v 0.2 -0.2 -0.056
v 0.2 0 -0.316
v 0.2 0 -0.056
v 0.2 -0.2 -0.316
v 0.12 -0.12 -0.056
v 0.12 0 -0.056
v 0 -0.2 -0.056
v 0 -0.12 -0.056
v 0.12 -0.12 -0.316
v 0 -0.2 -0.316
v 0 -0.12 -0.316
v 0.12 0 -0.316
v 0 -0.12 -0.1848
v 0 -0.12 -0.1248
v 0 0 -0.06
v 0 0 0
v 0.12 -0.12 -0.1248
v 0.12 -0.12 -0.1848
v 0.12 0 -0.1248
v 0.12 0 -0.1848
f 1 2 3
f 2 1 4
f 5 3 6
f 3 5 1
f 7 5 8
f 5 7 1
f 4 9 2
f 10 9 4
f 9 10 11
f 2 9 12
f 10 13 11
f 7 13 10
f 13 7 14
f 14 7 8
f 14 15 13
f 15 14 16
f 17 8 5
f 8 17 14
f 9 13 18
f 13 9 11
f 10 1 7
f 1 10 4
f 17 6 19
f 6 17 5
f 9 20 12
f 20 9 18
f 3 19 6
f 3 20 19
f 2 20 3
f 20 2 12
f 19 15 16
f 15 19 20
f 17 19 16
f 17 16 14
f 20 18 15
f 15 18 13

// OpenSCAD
// Tent shell kit: eave corner. See lib/lodge_kit.scad.
include <lib/lodge_kit.scad>
kind = "tent";
eave_corner();
